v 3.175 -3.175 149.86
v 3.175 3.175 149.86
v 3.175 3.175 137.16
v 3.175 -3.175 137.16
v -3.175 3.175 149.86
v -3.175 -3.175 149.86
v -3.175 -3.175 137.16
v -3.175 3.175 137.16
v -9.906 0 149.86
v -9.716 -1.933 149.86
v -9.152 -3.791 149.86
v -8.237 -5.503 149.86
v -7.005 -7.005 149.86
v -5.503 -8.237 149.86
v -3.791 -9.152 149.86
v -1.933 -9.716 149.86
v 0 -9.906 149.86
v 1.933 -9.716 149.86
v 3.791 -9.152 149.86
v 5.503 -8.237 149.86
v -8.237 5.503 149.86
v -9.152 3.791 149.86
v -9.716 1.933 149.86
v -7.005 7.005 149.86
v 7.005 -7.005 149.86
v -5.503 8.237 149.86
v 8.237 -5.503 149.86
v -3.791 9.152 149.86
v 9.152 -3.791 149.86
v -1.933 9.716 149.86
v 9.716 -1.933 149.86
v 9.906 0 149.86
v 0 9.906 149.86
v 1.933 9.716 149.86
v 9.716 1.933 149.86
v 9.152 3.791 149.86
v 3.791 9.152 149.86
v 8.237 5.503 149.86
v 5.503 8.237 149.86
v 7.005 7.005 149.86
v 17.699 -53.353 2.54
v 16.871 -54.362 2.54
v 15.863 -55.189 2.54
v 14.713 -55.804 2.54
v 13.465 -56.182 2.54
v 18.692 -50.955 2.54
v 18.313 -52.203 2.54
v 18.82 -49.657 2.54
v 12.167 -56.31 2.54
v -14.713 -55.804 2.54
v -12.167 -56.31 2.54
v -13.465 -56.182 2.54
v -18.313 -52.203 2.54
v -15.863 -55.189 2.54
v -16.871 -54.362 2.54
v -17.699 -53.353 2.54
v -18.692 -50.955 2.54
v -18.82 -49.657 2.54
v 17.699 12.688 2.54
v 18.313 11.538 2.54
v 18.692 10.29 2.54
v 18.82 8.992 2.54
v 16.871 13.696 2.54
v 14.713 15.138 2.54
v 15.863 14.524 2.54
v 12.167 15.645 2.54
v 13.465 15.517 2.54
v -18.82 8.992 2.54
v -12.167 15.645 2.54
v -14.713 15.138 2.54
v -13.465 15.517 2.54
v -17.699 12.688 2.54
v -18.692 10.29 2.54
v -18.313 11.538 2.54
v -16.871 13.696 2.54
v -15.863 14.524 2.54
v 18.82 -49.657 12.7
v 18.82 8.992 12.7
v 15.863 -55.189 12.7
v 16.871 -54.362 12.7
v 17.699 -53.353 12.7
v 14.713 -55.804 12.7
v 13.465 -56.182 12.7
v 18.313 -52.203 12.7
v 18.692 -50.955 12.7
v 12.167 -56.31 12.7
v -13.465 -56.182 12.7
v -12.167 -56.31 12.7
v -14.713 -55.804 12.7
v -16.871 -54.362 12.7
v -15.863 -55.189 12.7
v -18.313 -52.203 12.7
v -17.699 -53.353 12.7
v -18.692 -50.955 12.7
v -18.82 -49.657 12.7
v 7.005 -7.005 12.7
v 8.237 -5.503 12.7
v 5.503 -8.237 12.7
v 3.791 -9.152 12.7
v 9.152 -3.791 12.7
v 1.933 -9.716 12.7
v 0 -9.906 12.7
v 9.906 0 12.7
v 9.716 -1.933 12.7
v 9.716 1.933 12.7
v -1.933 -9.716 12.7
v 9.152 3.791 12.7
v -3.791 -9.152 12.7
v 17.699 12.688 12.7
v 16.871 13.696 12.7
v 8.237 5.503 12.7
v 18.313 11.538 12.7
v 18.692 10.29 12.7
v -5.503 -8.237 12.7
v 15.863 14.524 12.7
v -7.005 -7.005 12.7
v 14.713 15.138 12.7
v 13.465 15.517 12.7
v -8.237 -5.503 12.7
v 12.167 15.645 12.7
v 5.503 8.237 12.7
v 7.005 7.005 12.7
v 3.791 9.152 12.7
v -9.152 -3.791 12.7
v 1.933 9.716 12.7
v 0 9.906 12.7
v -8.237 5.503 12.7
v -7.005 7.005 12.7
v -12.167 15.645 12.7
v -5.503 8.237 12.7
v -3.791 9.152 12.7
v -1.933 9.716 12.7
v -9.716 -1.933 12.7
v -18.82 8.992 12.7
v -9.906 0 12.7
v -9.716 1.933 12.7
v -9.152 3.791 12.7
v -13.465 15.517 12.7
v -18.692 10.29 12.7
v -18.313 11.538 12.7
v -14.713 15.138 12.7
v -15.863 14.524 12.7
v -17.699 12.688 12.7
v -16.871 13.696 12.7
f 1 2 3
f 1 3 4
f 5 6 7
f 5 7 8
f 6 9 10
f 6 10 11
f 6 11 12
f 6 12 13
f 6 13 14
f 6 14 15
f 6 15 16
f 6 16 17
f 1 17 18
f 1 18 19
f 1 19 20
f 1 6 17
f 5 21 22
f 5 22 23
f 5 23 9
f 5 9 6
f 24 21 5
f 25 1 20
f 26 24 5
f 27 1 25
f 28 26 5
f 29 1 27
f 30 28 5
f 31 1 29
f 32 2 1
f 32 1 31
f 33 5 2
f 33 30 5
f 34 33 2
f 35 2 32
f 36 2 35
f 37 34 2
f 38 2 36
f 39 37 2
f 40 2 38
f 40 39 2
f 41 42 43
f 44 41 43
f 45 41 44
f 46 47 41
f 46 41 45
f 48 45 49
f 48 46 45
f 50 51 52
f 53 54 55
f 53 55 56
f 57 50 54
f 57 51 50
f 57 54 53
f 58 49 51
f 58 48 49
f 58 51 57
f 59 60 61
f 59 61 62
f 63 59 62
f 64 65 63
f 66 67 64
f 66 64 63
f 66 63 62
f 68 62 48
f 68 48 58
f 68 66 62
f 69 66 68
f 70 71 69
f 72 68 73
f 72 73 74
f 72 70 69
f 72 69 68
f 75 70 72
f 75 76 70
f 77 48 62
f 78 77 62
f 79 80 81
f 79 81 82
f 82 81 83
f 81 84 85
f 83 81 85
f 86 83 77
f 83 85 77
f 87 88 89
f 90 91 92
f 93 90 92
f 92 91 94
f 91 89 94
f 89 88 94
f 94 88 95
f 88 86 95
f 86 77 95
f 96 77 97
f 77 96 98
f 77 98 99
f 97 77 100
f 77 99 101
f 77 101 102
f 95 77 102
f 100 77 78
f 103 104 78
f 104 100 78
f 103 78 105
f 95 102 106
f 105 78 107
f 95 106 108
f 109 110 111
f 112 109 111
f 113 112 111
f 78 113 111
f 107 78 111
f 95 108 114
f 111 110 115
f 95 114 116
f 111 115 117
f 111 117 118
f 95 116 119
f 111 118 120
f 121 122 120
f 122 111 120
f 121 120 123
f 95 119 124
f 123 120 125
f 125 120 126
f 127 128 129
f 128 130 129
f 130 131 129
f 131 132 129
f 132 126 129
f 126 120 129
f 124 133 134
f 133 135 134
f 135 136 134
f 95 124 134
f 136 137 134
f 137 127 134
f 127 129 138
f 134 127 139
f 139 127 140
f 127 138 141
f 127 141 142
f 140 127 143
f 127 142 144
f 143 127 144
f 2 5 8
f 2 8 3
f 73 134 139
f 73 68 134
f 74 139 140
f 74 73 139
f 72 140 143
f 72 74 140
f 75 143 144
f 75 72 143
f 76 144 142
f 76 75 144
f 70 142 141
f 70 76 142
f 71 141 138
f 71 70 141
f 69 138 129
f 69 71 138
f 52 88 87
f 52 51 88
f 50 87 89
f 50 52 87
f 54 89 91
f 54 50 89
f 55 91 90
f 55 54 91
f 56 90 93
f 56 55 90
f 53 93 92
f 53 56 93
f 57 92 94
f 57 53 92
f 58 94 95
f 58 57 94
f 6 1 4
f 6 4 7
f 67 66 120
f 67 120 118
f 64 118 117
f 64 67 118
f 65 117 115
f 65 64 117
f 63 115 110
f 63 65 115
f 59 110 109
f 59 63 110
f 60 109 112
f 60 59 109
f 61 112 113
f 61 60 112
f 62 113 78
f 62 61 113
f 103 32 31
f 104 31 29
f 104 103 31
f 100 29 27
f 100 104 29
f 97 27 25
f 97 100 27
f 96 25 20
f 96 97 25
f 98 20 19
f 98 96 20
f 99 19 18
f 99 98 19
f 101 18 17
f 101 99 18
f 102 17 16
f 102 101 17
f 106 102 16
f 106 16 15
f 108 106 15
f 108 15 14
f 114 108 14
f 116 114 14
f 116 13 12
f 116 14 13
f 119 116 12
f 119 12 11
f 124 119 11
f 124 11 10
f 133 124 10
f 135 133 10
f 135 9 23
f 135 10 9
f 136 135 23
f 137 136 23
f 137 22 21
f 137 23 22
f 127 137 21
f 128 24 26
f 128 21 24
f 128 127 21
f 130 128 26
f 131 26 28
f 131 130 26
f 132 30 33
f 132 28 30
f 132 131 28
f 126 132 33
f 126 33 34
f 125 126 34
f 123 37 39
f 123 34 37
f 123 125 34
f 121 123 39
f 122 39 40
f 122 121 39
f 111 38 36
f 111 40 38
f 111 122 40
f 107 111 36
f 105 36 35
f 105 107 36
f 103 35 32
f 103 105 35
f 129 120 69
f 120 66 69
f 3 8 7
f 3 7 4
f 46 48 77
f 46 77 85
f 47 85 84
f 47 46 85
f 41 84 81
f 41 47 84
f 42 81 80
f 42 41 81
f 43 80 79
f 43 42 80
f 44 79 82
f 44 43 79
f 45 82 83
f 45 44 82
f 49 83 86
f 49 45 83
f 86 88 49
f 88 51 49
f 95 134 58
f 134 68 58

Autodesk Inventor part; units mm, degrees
ref_plane "YZ Plane" through (0, 0, 0) normal (1, 0, 0) x (0, 1, 0)
ref_plane "XZ Plane" through (0, 0, 0) normal (0, 1, 0) x (-1, 0, 0)
ref_plane "XY Plane" through (0, 0, 0) normal (0, 0, 1) x (1, 0, 0)
sketch "Sketch1" plane through (0, 0, 0) normal (0, 0, 1) x (1, 0, 0)
  circle A0 centre (0, 0) radius 9.906
  dimension "d0" = 19.812
extrude "Extrusion1" add sketch "Sketch1" along normal blind 149.86
sketch "Sketch2" plane through (0, 0, 149.86) normal (0, 0, 1) x (1, 0, 0)
  circle A0 centre (0, 0) radius 9.906 projected
  circle A1 centre (0, 0) radius 3.175
  line L0 (-3.175, 0) -> (0, 0)
  line L1 (0, 0) -> (0, 3.175)
  line L2 (0, 3.175) -> (-3.175, 3.175)
  line L3 (-3.175, 3.175) -> (-3.175, 0)
  line L4 (-3.175, 3.175) -> (3.175, 3.175)
  line L5 (3.175, 3.175) -> (3.175, -3.175)
  line L6 (3.175, -3.175) -> (-3.175, -3.175)
  line L7 (-3.175, -3.175) -> (-3.175, 3.175)
  dimension "d3" = 6.35
extrude "Extrusion2" cut sketch "Sketch2" against normal blind 12.7 contours A1 L0 L1 | L5 L6 A1 | A1 L4 L5 | L1 L0 A1 | A1 L3 L2 | L6 L7 A1
sketch "Sketch3" plane through (0, 0, 0) normal (0, 0, -1) x (-1, 0, 0)
  circle A0 centre (0, 0) radius 9.906 projected
  line L0 (0, 0) -> (-25.4, 0)
  line L1 (-25.4, 0) -> (-25.4, 25.4)
  line L2 (-25.4, 25.4) -> (0, 25.4)
  line L3 (0, 25.4) -> (0, 0)
  line L4 (-25.4, 25.4) -> (25.4, 25.4)
  line L5 (25.4, 25.4) -> (25.4, -25.4)
  line L6 (25.4, -25.4) -> (-25.4, -25.4)
  line L7 (-25.4, -25.4) -> (-25.4, 25.4)
  dimension "d6" = 25.4
  dimension "d7" = 25.4
  dimension "d8" = 50.8
  dimension "d9" = 50.8
extrude "Extrusion3" add sketch "Sketch3" against normal blind 12.7 contours A0 L3 L4 L5 L6 L7 L0 | L3 L0 A0 | A0 L0 L1 L2 L3 picked at (-6.1942, 2.1674)
sketch "Sketch4" plane through (-25.4, 25.4, 0) normal (0, 1, 0) x (1, 0, 0)
  line L0 (0, -12.7) -> (50.8, -12.7) projected
  line L1 (50.8, 0) -> (50.8, -12.7) projected
  line L2 (0, 0) -> (50.8, 0) projected
  line L3 (0, 0) -> (0, -12.7) projected
  point P0 (25.4, 0)
extrude "Extrusion4" cut sketch "Sketch4" against normal blind 6.35
sketch "Sketch5" plane through (0, 0, 0) normal (0, 0, -1) x (-1, 0, 0)
  line L0 (25.4, 19.05) -> (-25.4, 19.05) projected
  line L1 (-25.4, 19.05) -> (-25.4, -25.4) projected
  line L2 (-25.4, -25.4) -> (25.4, -25.4) projected
  line L3 (25.4, -25.4) -> (25.4, 19.05) projected
  line L4 (-25.4, 19.05) -> (25.4, 19.05)
  line L5 (25.4, 19.05) -> (25.4, -31.75)
  line L6 (25.4, -31.75) -> (-25.4, -31.75)
  line L7 (-25.4, -31.75) -> (-25.4, 19.05)
  point P0 (0, 0)
  dimension "d14" = 50.8
extrude "Extrusion5" add sketch "Sketch5" against normal blind 12.7 contours L5 L6 L7 L2
sketch "Sketch7" plane through (0, 0, 12.7) normal (0, 0, 1) x (1, 0, 0)
  line L0 (25.4, 19.05) -> (25.4, -31.75) projected
  circle A0 centre (0, 0) radius 9.906 projected
  line L1 (0, 9.906) -> (0, 16.6116)
  line L2 (0, 16.6116) -> (-19.7866, 16.6116)
  line L3 (-19.7866, 16.6116) -> (-19.7866, -57.277)
  line L4 (-19.7866, -57.277) -> (0, -57.277)
  line L5 (0, -57.277) -> (0, 16.6116)
  line L6 (-19.7866, 16.6116) -> (19.7866, 16.6116)
  line L7 (19.7866, 16.6116) -> (19.7866, -57.277)
  line L8 (19.7866, -57.277) -> (-19.7866, -57.277)
  line L9 (-19.7866, -57.277) -> (-19.7866, 16.6116)
  dimension "d17" = 6.7056
  dimension "d18" = 19.7866
  dimension "d19" = 73.8886
  dimension "d20" = 39.5732
extrude "Extrusion6" add sketch "Sketch7" against normal blind 50.8 contours A0 L1 L6 L7 L8 L5 | L5 A0 | A0 L5 L4 L3 L2 L1 picked at (-4.6219, 0.7927)
sketch "Sketch8" plane through (0, 0, 0) normal (0, 0, -1) x (-1, 0, 0)
  line L0 (-19.7866, -31.75) -> (-19.7866, 16.6116) projected
  line L1 (-19.7866, 16.6116) -> (19.7866, 16.6116) projected
  line L2 (19.7866, 16.6116) -> (19.7866, -31.75) projected
  line L3 (19.7866, -31.75) -> (25.4, -31.75) projected
  line L4 (25.4, -31.75) -> (25.4, 19.05) projected
  line L5 (25.4, 19.05) -> (-25.4, 19.05) projected
  line L6 (-25.4, 19.05) -> (-25.4, -31.75) projected
  line L7 (-25.4, -31.75) -> (-19.7866, -31.75) projected
  point P0 (0, 0)
extrude "Extrusion7" cut sketch "Sketch8" against normal blind 50.8
fillet "Fillet1" radius 6.35 4 edges at (19.7866, 16.6116, -12.7) (-19.7866, 16.6116, -12.7) (19.7866, -57.277, -12.7) (-19.7866, -57.277, -12.7)
sketch "Sketch9" plane through (0, 0, -38.1) normal (0, 0, -1) x (-1, 0, 0)
  arc A0 (13.4366, -57.277) -> (19.7866, -50.927) centre (13.4366, -50.927) ccw projected
  line L0 (19.7866, 10.2616) -> (19.7866, -50.927) projected
  arc A1 (19.7866, 10.2616) -> (13.4366, 16.6116) centre (13.4366, 10.2616) ccw projected
  line L1 (-13.4366, 16.6116) -> (13.4366, 16.6116) projected
  arc A2 (-13.4366, 16.6116) -> (-19.7866, 10.2616) centre (-13.4366, 10.2616) ccw projected
  line L2 (-19.7866, -50.927) -> (-19.7866, 10.2616) projected
  arc A3 (-19.7866, -50.927) -> (-13.4366, -57.277) centre (-13.4366, -50.927) ccw projected
  line L3 (13.4366, -57.277) -> (-13.4366, -57.277) projected
  line L4 (0, -9.906) -> (0, 9.906) projected
  arc A4 (0, 9.906) -> (0, -9.906) centre (0, 0) ccw projected
extrude "Extrusion8" cut sketch "Sketch9" against normal blind 25.4
sketch "Sketch10" plane through (0, 0, -12.7) normal (0, 0, -1) x (-1, 0, 0)
  arc A0 (0, 9.906) -> (0, -9.906) centre (0, 0) ccw projected
  line L0 (0, -9.906) -> (0, 9.906) projected
extrude "Extrusion9" add sketch "Sketch10" against normal blind 25.4
sketch "Sketch11" plane through (0, 0, -12.7) normal (0, 0, -1) x (-1, 0, 0)
  line L0 (19.7866, 10.2616) -> (19.7866, -50.927) projected
  arc A0 (19.7866, 10.2616) -> (13.4366, 16.6116) centre (13.4366, 10.2616) ccw projected
  line L1 (-13.4366, 16.6116) -> (13.4366, 16.6116) projected
  arc A1 (-13.4366, 16.6116) -> (-19.7866, 10.2616) centre (-13.4366, 10.2616) ccw projected
  line L2 (-19.7866, -50.927) -> (-19.7866, 10.2616) projected
  arc A2 (-19.7866, -50.927) -> (-13.4366, -57.277) centre (-13.4366, -50.927) ccw projected
  line L3 (13.4366, -57.277) -> (-13.4366, -57.277) projected
  arc A3 (13.4366, -57.277) -> (19.7866, -50.927) centre (13.4366, -50.927) ccw projected
  point P0 (0, 0)
extrude "Extrusion10" cut sketch "Sketch11" against normal blind 12.7
sketch "Sketch12" plane through (0, 0, 0) normal (0, 0, -1) x (-1, 0, 0)
  line L0 (-19.7866, 16.6116) -> (19.7866, 16.6116)
  line L1 (19.7866, 16.6116) -> (19.7866, -57.277)
  line L2 (19.7866, -57.277) -> (-19.7866, -57.277)
  line L3 (-19.7866, -57.277) -> (-19.7866, 16.6116)
  point P0 (0, 0)
extrude "Extrusion11" add sketch "Sketch12" against normal blind 12.7
fillet "Fillet2" radius 7.62 4 edges at (19.7866, 16.6116, 6.35) (-19.7866, 16.6116, 6.35) (-19.7866, -57.277, 6.35) (19.7866, -57.277, 6.35)
sketch "Sketch13" plane through (0, 0, 0) normal (0, 0, -1) x (-1, 0, 0)
  arc A0 (-19.7866, -49.657) -> (-12.1666, -57.277) centre (-12.1666, -49.657) ccw projected
  line L0 (12.1666, -57.277) -> (-12.1666, -57.277) projected
  arc A1 (12.1666, -57.277) -> (19.7866, -49.657) centre (12.1666, -49.657) ccw projected
  line L1 (19.7866, 8.9916) -> (19.7866, -49.657) projected
  arc A2 (19.7866, 8.9916) -> (12.1666, 16.6116) centre (12.1666, 8.9916) ccw projected
  line L2 (-12.1666, 16.6116) -> (12.1666, 16.6116) projected
  arc A3 (-12.1666, 16.6116) -> (-19.7866, 8.9916) centre (-12.1666, 8.9916) ccw projected
  line L3 (-19.7866, -49.657) -> (-19.7866, 8.9916) projected
  arc A4 (18.8199, 8.9916) -> (12.1666, 15.6449) centre (12.1666, 8.9916) ccw
  line L4 (18.8199, 8.9916) -> (18.8199, -49.657)
  arc A5 (12.1666, -56.3103) -> (18.8199, -49.657) centre (12.1666, -49.657) ccw
  line L5 (12.1666, -56.3103) -> (-12.1666, -56.3103)
  arc A6 (-18.8199, -49.657) -> (-12.1666, -56.3103) centre (-12.1666, -49.657) ccw
  line L6 (-18.8199, -49.657) -> (-18.8199, 8.9916)
  arc A7 (-12.1666, 15.6449) -> (-18.8199, 8.9916) centre (-12.1666, 8.9916) ccw
  line L7 (-12.1666, 15.6449) -> (12.1666, 15.6449)
  point P0 (0, 0)
extrude "Extrusion12" cut sketch "Sketch13" against normal blind 12.7
sketch "Sketch14" plane through (0, 0, 0) normal (0, 0, -1) x (-1, 0, 0)
  line L0 (12.1666, 15.6449) -> (-12.1666, 15.6449) projected
  arc A0 (-12.1666, 15.6449) -> (-18.8199, 8.9916) centre (-12.1666, 8.9916) ccw projected
  line L1 (-18.8199, 8.9916) -> (-18.8199, -49.657) projected
  arc A1 (-18.8199, -49.657) -> (-12.1666, -56.3103) centre (-12.1666, -49.657) ccw projected
  line L2 (-12.1666, -56.3103) -> (12.1666, -56.3103) projected
  arc A2 (12.1666, -56.3103) -> (18.8199, -49.657) centre (12.1666, -49.657) ccw projected
  line L3 (18.8199, -49.657) -> (18.8199, 8.9916) projected
  arc A3 (18.8199, 8.9916) -> (12.1666, 15.6449) centre (12.1666, 8.9916) ccw projected
  point P0 (0, 0)
extrude "Extrusion13" cut sketch "Sketch14" against normal blind 2.54
sketch "Sketch15" plane through (0, 0, 2.54) normal (0, 0, -1) x (-1, 0, 0)
  arc A0 (-12.1666, 15.6449) -> (-18.8199, 8.9916) centre (-12.1666, 8.9916) ccw projected
  line L0 (-18.8199, -49.657) -> (-18.8199, 8.9916) projected
  arc A1 (-18.8199, -49.657) -> (-12.1666, -56.3103) centre (-12.1666, -49.657) ccw projected
  line L1 (12.1666, -56.3103) -> (-12.1666, -56.3103) projected
  arc A2 (12.1666, -56.3103) -> (18.8199, -49.657) centre (12.1666, -49.657) ccw projected
  line L2 (18.8199, 8.9916) -> (18.8199, -49.657) projected
  arc A3 (18.8199, 8.9916) -> (12.1666, 15.6449) centre (12.1666, 8.9916) ccw projected
  line L3 (-12.1666, 15.6449) -> (12.1666, 15.6449) projected
  point P0 (0, 0)
properties part number "linac arm2"
